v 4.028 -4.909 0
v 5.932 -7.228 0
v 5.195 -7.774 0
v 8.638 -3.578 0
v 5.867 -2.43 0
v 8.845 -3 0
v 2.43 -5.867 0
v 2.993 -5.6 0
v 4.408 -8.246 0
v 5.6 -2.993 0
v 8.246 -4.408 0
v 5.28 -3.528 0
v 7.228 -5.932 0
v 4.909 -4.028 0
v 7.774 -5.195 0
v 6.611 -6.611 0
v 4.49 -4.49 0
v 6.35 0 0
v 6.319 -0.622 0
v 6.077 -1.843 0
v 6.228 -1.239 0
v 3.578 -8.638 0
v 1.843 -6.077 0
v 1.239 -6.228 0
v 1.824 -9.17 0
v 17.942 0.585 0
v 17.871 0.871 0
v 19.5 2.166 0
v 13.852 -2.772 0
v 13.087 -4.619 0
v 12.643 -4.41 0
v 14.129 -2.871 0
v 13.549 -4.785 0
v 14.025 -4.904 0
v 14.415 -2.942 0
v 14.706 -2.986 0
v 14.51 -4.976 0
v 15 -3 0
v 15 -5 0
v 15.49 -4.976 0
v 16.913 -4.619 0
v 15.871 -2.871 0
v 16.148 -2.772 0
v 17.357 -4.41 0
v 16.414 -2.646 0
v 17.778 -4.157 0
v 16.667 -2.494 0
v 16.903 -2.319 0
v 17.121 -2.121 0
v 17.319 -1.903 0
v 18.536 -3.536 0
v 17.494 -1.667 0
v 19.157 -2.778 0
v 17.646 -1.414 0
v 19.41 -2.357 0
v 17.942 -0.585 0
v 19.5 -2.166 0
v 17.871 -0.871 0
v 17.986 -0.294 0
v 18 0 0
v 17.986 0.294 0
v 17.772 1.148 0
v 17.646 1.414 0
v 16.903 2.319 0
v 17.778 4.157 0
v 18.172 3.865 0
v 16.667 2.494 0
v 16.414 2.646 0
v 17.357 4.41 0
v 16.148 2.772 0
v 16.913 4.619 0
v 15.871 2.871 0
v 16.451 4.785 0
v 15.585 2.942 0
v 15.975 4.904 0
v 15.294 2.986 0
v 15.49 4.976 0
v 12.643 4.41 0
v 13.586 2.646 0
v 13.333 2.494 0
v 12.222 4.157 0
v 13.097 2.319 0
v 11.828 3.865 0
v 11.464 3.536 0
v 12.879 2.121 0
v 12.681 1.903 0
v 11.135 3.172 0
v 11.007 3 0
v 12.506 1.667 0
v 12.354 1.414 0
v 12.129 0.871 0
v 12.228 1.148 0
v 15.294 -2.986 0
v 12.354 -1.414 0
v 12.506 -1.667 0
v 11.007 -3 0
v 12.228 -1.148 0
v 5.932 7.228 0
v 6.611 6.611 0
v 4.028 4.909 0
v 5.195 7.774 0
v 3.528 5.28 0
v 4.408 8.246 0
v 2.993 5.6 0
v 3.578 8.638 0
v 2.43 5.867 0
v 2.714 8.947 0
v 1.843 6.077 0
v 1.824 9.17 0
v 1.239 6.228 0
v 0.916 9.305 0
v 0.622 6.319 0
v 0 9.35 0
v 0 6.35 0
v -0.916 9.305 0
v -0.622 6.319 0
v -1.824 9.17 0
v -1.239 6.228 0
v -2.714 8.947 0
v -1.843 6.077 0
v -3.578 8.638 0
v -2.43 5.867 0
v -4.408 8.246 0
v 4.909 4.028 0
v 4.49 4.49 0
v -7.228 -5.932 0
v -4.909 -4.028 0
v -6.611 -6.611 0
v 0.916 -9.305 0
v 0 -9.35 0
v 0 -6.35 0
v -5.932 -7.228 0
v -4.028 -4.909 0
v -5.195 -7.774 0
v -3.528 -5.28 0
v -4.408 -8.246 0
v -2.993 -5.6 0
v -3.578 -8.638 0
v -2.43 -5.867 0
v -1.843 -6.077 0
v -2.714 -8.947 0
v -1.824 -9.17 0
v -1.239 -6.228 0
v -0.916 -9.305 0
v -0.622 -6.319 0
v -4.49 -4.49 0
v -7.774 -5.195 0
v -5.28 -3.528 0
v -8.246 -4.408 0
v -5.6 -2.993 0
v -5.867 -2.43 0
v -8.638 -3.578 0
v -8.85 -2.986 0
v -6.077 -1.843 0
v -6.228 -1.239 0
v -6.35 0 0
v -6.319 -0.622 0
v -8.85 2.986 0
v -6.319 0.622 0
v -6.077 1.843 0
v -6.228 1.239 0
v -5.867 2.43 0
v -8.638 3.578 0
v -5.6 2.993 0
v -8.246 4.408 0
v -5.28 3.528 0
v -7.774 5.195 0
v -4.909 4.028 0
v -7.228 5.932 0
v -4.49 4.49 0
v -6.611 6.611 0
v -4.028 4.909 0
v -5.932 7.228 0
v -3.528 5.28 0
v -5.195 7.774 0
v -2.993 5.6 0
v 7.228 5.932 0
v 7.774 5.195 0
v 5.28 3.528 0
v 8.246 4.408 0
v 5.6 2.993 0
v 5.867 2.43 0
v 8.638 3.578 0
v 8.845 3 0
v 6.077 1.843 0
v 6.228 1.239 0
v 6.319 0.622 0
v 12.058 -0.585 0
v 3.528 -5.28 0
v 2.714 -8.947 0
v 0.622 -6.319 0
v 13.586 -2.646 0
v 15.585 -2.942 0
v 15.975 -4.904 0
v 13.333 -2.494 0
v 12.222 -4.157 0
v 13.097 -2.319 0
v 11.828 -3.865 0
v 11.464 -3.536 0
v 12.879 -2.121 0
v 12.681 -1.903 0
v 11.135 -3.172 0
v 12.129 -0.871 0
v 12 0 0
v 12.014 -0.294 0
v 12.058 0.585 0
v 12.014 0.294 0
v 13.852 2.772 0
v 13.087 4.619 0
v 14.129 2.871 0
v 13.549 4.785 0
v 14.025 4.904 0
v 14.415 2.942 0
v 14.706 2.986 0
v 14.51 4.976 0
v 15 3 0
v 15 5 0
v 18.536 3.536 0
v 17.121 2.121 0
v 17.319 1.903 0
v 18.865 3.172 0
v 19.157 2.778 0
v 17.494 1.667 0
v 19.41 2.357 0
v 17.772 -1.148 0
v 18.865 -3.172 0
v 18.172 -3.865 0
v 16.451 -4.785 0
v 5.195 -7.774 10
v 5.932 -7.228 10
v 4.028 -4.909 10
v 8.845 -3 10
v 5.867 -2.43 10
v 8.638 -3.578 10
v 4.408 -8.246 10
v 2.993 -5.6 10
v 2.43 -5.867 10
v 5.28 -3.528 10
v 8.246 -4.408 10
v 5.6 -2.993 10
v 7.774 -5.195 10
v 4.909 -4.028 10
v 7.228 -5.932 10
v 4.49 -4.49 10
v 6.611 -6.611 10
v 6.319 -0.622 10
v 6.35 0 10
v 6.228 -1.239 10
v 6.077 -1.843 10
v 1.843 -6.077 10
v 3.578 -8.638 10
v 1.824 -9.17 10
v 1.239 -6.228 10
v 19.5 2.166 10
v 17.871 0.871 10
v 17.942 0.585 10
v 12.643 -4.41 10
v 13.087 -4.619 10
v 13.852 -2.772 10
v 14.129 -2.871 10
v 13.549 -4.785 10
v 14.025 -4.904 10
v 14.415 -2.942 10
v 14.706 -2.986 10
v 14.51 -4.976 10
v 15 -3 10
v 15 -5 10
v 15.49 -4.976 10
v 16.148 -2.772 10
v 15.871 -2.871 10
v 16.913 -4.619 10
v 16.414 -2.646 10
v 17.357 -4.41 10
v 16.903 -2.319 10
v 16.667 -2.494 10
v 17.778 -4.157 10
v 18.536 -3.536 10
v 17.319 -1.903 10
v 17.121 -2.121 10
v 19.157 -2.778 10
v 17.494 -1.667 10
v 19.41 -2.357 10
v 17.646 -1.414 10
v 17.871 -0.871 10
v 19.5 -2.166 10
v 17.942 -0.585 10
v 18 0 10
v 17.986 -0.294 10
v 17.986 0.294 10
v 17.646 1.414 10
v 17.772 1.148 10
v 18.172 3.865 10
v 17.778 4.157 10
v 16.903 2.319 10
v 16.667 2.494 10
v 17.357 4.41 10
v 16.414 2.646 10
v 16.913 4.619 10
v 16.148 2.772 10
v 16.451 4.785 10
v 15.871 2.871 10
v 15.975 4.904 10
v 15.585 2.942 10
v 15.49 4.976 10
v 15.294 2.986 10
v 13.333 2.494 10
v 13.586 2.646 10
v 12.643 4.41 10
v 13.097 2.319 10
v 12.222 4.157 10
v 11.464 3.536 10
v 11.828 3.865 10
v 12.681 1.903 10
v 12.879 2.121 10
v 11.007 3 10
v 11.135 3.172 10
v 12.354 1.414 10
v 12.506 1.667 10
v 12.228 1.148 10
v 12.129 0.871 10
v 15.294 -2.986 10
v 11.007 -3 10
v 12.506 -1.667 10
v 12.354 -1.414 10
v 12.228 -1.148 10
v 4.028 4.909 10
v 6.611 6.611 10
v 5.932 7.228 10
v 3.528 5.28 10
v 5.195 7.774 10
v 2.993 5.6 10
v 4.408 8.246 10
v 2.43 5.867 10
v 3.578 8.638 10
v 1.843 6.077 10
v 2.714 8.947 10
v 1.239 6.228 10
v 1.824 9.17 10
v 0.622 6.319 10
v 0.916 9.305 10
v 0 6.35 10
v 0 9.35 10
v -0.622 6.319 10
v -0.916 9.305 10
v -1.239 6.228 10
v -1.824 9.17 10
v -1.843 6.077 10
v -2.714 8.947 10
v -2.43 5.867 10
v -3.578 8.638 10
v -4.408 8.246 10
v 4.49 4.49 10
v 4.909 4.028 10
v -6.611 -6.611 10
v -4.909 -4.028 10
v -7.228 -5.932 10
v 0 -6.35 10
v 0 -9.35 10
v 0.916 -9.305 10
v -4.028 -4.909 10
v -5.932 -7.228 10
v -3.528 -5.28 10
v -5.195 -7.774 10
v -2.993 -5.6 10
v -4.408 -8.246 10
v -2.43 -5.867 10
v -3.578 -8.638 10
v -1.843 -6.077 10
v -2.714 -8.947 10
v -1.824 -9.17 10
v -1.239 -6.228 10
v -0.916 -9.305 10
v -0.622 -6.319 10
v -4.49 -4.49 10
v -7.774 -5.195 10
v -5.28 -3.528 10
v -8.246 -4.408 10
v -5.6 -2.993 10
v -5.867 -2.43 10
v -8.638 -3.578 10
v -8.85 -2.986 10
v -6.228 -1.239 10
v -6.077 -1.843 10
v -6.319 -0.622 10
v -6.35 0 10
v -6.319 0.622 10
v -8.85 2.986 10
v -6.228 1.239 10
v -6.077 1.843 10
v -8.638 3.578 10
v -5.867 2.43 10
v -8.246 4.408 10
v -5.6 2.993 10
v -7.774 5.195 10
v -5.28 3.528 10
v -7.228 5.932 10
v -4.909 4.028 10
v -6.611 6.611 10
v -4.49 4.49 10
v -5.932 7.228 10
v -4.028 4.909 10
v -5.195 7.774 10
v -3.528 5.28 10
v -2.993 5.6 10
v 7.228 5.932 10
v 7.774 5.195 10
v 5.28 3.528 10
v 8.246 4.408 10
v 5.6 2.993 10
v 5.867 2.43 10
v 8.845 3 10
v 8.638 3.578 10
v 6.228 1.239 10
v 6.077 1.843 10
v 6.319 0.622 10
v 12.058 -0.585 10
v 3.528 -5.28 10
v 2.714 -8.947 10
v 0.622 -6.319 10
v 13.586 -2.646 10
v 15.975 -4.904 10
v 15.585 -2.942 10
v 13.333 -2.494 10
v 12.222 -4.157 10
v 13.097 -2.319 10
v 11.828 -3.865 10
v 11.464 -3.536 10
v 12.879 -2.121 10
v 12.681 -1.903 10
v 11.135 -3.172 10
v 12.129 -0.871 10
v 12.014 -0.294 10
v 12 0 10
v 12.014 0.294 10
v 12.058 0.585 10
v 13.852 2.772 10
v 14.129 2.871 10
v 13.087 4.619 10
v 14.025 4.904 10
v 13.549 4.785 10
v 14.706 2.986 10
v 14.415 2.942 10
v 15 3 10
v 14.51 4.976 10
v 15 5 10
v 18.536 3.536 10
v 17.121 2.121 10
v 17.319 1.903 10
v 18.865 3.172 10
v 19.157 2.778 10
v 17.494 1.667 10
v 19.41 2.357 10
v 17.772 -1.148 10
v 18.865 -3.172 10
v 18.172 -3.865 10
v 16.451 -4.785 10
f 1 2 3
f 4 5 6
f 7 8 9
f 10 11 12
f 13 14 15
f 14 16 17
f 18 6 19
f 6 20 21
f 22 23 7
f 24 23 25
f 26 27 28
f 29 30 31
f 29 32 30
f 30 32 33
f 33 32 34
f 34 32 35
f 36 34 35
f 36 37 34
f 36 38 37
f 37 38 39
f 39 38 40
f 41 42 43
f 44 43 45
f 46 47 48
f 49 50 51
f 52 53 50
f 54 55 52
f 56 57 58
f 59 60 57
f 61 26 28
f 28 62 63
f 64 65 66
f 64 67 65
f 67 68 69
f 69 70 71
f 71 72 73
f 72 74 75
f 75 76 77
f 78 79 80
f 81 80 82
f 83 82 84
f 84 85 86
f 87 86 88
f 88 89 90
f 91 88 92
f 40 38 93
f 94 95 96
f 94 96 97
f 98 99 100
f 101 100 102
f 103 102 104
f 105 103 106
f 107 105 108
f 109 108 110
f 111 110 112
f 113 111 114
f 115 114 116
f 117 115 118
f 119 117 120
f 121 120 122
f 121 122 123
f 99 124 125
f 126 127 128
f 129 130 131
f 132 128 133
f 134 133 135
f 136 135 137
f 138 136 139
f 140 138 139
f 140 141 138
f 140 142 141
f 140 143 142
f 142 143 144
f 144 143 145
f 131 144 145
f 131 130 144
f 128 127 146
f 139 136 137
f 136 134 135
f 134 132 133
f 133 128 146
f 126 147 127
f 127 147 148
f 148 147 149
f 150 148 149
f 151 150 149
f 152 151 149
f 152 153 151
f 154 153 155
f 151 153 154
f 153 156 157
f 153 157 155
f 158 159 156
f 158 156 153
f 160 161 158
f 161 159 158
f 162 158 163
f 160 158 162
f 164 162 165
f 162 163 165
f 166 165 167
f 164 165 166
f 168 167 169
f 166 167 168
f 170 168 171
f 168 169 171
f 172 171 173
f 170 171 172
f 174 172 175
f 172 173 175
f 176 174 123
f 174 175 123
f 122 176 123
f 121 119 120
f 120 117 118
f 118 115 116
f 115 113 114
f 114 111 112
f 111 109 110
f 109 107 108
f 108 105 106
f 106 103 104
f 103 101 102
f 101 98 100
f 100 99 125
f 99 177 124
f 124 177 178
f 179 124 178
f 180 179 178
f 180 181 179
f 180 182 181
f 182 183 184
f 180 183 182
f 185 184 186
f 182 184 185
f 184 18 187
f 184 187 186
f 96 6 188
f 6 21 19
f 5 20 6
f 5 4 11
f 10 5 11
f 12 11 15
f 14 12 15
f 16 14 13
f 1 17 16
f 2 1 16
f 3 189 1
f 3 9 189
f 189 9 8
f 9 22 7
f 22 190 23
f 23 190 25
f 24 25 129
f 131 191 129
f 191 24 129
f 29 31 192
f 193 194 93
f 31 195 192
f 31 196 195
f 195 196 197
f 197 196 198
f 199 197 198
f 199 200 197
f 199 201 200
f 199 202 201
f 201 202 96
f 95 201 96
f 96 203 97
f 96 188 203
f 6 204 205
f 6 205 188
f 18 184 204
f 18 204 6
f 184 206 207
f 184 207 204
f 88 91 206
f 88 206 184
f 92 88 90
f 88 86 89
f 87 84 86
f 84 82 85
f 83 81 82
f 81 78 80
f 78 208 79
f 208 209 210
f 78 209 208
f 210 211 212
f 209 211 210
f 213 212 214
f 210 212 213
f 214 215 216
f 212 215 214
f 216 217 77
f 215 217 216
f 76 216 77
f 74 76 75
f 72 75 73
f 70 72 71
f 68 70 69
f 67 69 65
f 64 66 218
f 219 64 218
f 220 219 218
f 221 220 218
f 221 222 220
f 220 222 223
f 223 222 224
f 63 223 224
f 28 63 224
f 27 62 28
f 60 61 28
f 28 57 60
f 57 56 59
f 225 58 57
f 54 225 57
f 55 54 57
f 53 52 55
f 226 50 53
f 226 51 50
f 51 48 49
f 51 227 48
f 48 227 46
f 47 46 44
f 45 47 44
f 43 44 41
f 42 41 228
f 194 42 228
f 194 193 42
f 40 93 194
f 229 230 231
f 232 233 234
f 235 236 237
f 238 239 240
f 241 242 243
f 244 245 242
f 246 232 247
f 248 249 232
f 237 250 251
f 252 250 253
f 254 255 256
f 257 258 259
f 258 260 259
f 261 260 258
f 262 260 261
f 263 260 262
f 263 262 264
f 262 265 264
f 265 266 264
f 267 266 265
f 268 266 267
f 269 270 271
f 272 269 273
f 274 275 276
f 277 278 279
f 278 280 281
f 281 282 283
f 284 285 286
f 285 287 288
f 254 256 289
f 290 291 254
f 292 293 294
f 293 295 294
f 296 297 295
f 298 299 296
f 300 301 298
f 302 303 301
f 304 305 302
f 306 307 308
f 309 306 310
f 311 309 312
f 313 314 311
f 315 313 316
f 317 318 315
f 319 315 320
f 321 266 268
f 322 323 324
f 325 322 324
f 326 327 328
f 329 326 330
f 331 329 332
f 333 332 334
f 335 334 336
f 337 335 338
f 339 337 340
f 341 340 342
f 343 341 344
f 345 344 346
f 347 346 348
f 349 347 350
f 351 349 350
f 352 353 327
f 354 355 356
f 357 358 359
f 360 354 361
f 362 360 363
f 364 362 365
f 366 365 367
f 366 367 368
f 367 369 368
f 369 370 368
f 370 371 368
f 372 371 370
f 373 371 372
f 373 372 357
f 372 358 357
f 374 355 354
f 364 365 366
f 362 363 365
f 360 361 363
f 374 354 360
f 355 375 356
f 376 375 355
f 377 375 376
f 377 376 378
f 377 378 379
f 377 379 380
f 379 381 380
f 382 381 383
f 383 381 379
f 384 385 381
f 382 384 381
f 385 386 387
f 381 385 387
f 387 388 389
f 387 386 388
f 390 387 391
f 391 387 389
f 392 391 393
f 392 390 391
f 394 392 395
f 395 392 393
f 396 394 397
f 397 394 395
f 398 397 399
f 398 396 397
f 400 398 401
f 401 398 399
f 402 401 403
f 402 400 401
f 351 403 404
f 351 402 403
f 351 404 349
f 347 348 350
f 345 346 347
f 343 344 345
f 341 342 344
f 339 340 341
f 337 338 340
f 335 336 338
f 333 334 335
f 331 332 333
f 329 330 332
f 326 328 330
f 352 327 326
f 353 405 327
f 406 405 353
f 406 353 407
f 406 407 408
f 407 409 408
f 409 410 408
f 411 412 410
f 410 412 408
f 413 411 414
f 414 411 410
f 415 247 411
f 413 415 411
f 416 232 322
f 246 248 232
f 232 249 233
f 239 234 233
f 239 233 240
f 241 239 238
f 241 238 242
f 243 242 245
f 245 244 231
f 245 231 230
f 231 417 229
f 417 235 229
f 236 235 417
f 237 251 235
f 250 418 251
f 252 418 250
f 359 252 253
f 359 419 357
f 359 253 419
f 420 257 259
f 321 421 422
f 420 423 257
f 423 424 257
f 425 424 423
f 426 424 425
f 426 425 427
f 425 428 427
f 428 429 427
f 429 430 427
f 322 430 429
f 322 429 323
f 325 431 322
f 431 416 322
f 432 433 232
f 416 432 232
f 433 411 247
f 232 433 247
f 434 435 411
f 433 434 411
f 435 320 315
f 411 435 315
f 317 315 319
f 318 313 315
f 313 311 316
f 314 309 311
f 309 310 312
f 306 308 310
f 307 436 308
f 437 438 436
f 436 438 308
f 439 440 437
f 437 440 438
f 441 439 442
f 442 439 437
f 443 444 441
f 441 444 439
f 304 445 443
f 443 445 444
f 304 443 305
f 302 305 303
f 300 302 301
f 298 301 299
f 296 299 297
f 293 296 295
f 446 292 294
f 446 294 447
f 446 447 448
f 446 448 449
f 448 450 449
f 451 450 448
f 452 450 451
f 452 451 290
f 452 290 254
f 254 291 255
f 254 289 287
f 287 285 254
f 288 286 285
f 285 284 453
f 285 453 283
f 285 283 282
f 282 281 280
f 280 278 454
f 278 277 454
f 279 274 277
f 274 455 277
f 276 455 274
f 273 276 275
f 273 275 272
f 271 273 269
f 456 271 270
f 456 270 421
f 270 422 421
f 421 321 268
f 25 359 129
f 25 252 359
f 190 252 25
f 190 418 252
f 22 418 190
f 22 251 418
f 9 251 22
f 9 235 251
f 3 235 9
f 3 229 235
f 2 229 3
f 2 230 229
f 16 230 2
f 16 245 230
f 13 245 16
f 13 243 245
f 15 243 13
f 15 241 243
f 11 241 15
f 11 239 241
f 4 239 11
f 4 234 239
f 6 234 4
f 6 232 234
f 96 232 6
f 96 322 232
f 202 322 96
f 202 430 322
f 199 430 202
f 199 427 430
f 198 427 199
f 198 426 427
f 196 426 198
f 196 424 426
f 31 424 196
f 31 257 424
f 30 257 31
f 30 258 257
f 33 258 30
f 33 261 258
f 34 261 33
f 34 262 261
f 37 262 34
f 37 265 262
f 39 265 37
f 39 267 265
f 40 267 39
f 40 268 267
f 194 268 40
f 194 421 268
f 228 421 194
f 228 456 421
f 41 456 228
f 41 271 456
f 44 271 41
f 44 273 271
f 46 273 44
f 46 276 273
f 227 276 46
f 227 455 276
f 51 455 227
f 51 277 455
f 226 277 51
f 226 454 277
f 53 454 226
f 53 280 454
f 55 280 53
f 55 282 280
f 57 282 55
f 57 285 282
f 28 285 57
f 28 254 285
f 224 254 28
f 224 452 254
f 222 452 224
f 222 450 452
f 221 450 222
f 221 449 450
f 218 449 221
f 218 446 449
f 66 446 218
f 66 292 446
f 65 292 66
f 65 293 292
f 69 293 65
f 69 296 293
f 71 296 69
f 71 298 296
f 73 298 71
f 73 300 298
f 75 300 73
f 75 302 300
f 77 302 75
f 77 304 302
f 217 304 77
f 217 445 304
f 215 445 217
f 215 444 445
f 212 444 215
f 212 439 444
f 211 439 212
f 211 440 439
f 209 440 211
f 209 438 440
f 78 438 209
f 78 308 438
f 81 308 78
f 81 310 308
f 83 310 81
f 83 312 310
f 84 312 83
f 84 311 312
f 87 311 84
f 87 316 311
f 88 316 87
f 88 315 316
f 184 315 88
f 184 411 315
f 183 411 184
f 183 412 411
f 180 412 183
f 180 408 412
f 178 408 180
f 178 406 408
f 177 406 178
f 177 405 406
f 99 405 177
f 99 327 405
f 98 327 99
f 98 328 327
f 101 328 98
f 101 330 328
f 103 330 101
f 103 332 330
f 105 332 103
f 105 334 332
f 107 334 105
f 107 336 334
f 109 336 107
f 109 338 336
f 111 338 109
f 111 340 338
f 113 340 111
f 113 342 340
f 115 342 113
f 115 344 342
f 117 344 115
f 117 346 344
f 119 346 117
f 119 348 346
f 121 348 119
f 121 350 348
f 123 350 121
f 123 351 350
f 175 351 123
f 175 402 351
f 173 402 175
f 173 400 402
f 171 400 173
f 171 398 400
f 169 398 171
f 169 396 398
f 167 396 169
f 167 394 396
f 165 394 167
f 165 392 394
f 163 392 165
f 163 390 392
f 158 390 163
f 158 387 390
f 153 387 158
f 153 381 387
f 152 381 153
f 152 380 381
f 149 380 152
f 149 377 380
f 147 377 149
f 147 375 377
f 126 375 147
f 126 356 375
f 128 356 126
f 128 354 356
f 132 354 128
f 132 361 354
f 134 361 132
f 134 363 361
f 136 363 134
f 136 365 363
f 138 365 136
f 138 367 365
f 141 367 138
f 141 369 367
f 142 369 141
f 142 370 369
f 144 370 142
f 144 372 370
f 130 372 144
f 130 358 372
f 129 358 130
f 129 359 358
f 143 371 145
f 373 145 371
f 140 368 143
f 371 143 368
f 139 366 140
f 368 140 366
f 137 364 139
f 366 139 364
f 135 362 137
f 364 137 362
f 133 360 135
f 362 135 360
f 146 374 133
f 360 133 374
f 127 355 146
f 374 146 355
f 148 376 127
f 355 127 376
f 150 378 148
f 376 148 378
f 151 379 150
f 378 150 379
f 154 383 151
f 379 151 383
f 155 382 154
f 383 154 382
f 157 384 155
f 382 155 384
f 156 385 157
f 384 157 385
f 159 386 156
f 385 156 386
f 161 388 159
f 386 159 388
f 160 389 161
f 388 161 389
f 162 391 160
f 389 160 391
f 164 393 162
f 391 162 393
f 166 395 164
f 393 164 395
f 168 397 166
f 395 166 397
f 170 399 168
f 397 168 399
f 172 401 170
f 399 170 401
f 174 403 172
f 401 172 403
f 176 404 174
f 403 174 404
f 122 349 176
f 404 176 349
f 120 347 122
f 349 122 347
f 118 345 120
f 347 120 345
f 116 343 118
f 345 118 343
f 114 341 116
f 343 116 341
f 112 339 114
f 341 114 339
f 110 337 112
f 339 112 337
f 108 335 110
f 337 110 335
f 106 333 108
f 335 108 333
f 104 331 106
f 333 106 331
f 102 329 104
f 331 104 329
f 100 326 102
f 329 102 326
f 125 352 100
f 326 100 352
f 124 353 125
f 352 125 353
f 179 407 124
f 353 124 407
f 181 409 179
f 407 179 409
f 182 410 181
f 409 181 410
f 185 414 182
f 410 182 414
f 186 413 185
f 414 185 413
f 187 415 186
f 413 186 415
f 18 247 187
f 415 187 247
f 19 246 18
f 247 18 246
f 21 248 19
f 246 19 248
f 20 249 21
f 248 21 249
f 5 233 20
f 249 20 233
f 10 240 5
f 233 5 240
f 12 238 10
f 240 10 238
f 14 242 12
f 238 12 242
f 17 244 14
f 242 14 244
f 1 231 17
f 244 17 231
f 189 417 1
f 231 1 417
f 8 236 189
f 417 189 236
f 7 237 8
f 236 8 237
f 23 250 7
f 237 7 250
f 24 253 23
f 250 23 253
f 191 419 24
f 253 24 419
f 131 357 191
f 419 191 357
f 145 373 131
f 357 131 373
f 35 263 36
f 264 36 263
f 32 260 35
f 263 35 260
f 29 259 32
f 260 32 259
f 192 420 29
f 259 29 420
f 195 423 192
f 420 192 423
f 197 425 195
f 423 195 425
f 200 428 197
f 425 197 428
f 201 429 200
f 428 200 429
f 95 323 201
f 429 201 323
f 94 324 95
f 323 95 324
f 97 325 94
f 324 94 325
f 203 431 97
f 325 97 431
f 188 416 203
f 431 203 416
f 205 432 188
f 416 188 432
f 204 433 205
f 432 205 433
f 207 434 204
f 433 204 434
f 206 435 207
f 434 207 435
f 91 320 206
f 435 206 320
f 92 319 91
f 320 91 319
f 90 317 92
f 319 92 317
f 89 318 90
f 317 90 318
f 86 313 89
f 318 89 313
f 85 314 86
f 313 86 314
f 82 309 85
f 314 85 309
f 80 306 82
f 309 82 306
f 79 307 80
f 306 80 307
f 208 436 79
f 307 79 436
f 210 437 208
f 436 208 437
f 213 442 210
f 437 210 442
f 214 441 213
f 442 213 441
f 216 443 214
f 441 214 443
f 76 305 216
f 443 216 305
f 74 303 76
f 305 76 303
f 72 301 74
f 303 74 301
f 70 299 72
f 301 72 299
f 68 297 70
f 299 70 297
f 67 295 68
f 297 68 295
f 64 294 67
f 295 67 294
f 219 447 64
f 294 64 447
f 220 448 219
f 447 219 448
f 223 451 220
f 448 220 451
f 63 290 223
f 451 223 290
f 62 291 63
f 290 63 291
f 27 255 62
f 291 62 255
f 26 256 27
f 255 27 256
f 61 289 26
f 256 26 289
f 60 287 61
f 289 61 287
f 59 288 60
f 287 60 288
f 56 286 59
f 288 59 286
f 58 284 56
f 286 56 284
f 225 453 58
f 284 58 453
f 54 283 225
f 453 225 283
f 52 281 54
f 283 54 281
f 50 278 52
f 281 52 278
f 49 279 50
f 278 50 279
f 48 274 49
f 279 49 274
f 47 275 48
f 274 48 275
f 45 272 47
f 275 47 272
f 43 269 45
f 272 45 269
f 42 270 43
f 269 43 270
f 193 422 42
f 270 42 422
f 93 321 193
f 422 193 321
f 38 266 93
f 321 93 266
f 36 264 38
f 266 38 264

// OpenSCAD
// Snap-on clip for 12.7 mm lab stand rod and 6 mm ID tubing
// Printed flat: 10 mm tall extrusion (Z) of a 2-D profile in the XY plane.

// Extrusion height (Z)
extrusion_height = 10;

// Rod ring dimensions
rod_ring_id = 12.7;          // Inner diameter of rod ring
rod_ring_wall = 3;           // Wall thickness of rod ring
rod_ring_od = rod_ring_id + 2 * rod_ring_wall; // Outer diameter of rod ring

// Rod ring opening dimensions
rod_opening_width = 10;      // Width of the opening on the -X side
rod_opening_half_width = rod_opening_width / 2;

// Tubing ring dimensions
tubing_ring_id = 6;          // Inner diameter of tubing ring
tubing_ring_wall = 2;        // Wall thickness of tubing ring
tubing_ring_od = tubing_ring_id + 2 * tubing_ring_wall; // Outer diameter of tubing ring
tubing_ring_center_x = 15;   // X position of tubing ring center

// Tubing ring opening dimensions
tubing_opening_width = 4.5;  // Width of the opening on the +X side
tubing_opening_half_width = tubing_opening_width / 2;

// Bridge dimensions
bridge_x_start = 8;          // Start X of the bridge
bridge_x_end = 12;           // End X of the bridge
bridge_width = 6;            // Width of the bridge in Y
bridge_half_width = bridge_width / 2;

// Resolution for curved shapes
$fn = 64;

// Extrude the profile to create the 3D part
linear_extrude(height = extrusion_height, center = false, convexity = 10)
{
    // Union of all profile parts
    union()
    {
        // Rod ring centered at origin with opening on -X side
        difference()
        {
            // Outer circle of rod ring
            circle(d = rod_ring_od);
            
            // Inner hole of rod ring
            circle(d = rod_ring_id);
            
            // Opening cut on -X side: x < 0 and -5 < y < 5
            // We cut a rectangle that extends past the ring to ensure clean removal
            translate([-rod_ring_od, 0])
                square([rod_ring_od + 1, rod_opening_width + 0.02], center = true);
        }
        
        // Tubing ring centered at (15, 0) with opening on +X side
        translate([tubing_ring_center_x, 0])
        difference()
        {
            // Outer circle of tubing ring
            circle(d = tubing_ring_od);
            
            // Inner hole of tubing ring
            circle(d = tubing_ring_id);
            
            // Opening cut on +X side: x > 15 and -2.25 < y < 2.25
            // We cut a rectangle that extends past the ring to ensure clean removal
            translate([tubing_ring_od, 0])
                square([tubing_ring_od + 1, tubing_opening_width + 0.02], center = true);
        }
        
        // Bridge connecting the two rings
        translate([(bridge_x_start + bridge_x_end) / 2, 0])
            square([bridge_x_end - bridge_x_start, bridge_width], center = true);
    }
}
